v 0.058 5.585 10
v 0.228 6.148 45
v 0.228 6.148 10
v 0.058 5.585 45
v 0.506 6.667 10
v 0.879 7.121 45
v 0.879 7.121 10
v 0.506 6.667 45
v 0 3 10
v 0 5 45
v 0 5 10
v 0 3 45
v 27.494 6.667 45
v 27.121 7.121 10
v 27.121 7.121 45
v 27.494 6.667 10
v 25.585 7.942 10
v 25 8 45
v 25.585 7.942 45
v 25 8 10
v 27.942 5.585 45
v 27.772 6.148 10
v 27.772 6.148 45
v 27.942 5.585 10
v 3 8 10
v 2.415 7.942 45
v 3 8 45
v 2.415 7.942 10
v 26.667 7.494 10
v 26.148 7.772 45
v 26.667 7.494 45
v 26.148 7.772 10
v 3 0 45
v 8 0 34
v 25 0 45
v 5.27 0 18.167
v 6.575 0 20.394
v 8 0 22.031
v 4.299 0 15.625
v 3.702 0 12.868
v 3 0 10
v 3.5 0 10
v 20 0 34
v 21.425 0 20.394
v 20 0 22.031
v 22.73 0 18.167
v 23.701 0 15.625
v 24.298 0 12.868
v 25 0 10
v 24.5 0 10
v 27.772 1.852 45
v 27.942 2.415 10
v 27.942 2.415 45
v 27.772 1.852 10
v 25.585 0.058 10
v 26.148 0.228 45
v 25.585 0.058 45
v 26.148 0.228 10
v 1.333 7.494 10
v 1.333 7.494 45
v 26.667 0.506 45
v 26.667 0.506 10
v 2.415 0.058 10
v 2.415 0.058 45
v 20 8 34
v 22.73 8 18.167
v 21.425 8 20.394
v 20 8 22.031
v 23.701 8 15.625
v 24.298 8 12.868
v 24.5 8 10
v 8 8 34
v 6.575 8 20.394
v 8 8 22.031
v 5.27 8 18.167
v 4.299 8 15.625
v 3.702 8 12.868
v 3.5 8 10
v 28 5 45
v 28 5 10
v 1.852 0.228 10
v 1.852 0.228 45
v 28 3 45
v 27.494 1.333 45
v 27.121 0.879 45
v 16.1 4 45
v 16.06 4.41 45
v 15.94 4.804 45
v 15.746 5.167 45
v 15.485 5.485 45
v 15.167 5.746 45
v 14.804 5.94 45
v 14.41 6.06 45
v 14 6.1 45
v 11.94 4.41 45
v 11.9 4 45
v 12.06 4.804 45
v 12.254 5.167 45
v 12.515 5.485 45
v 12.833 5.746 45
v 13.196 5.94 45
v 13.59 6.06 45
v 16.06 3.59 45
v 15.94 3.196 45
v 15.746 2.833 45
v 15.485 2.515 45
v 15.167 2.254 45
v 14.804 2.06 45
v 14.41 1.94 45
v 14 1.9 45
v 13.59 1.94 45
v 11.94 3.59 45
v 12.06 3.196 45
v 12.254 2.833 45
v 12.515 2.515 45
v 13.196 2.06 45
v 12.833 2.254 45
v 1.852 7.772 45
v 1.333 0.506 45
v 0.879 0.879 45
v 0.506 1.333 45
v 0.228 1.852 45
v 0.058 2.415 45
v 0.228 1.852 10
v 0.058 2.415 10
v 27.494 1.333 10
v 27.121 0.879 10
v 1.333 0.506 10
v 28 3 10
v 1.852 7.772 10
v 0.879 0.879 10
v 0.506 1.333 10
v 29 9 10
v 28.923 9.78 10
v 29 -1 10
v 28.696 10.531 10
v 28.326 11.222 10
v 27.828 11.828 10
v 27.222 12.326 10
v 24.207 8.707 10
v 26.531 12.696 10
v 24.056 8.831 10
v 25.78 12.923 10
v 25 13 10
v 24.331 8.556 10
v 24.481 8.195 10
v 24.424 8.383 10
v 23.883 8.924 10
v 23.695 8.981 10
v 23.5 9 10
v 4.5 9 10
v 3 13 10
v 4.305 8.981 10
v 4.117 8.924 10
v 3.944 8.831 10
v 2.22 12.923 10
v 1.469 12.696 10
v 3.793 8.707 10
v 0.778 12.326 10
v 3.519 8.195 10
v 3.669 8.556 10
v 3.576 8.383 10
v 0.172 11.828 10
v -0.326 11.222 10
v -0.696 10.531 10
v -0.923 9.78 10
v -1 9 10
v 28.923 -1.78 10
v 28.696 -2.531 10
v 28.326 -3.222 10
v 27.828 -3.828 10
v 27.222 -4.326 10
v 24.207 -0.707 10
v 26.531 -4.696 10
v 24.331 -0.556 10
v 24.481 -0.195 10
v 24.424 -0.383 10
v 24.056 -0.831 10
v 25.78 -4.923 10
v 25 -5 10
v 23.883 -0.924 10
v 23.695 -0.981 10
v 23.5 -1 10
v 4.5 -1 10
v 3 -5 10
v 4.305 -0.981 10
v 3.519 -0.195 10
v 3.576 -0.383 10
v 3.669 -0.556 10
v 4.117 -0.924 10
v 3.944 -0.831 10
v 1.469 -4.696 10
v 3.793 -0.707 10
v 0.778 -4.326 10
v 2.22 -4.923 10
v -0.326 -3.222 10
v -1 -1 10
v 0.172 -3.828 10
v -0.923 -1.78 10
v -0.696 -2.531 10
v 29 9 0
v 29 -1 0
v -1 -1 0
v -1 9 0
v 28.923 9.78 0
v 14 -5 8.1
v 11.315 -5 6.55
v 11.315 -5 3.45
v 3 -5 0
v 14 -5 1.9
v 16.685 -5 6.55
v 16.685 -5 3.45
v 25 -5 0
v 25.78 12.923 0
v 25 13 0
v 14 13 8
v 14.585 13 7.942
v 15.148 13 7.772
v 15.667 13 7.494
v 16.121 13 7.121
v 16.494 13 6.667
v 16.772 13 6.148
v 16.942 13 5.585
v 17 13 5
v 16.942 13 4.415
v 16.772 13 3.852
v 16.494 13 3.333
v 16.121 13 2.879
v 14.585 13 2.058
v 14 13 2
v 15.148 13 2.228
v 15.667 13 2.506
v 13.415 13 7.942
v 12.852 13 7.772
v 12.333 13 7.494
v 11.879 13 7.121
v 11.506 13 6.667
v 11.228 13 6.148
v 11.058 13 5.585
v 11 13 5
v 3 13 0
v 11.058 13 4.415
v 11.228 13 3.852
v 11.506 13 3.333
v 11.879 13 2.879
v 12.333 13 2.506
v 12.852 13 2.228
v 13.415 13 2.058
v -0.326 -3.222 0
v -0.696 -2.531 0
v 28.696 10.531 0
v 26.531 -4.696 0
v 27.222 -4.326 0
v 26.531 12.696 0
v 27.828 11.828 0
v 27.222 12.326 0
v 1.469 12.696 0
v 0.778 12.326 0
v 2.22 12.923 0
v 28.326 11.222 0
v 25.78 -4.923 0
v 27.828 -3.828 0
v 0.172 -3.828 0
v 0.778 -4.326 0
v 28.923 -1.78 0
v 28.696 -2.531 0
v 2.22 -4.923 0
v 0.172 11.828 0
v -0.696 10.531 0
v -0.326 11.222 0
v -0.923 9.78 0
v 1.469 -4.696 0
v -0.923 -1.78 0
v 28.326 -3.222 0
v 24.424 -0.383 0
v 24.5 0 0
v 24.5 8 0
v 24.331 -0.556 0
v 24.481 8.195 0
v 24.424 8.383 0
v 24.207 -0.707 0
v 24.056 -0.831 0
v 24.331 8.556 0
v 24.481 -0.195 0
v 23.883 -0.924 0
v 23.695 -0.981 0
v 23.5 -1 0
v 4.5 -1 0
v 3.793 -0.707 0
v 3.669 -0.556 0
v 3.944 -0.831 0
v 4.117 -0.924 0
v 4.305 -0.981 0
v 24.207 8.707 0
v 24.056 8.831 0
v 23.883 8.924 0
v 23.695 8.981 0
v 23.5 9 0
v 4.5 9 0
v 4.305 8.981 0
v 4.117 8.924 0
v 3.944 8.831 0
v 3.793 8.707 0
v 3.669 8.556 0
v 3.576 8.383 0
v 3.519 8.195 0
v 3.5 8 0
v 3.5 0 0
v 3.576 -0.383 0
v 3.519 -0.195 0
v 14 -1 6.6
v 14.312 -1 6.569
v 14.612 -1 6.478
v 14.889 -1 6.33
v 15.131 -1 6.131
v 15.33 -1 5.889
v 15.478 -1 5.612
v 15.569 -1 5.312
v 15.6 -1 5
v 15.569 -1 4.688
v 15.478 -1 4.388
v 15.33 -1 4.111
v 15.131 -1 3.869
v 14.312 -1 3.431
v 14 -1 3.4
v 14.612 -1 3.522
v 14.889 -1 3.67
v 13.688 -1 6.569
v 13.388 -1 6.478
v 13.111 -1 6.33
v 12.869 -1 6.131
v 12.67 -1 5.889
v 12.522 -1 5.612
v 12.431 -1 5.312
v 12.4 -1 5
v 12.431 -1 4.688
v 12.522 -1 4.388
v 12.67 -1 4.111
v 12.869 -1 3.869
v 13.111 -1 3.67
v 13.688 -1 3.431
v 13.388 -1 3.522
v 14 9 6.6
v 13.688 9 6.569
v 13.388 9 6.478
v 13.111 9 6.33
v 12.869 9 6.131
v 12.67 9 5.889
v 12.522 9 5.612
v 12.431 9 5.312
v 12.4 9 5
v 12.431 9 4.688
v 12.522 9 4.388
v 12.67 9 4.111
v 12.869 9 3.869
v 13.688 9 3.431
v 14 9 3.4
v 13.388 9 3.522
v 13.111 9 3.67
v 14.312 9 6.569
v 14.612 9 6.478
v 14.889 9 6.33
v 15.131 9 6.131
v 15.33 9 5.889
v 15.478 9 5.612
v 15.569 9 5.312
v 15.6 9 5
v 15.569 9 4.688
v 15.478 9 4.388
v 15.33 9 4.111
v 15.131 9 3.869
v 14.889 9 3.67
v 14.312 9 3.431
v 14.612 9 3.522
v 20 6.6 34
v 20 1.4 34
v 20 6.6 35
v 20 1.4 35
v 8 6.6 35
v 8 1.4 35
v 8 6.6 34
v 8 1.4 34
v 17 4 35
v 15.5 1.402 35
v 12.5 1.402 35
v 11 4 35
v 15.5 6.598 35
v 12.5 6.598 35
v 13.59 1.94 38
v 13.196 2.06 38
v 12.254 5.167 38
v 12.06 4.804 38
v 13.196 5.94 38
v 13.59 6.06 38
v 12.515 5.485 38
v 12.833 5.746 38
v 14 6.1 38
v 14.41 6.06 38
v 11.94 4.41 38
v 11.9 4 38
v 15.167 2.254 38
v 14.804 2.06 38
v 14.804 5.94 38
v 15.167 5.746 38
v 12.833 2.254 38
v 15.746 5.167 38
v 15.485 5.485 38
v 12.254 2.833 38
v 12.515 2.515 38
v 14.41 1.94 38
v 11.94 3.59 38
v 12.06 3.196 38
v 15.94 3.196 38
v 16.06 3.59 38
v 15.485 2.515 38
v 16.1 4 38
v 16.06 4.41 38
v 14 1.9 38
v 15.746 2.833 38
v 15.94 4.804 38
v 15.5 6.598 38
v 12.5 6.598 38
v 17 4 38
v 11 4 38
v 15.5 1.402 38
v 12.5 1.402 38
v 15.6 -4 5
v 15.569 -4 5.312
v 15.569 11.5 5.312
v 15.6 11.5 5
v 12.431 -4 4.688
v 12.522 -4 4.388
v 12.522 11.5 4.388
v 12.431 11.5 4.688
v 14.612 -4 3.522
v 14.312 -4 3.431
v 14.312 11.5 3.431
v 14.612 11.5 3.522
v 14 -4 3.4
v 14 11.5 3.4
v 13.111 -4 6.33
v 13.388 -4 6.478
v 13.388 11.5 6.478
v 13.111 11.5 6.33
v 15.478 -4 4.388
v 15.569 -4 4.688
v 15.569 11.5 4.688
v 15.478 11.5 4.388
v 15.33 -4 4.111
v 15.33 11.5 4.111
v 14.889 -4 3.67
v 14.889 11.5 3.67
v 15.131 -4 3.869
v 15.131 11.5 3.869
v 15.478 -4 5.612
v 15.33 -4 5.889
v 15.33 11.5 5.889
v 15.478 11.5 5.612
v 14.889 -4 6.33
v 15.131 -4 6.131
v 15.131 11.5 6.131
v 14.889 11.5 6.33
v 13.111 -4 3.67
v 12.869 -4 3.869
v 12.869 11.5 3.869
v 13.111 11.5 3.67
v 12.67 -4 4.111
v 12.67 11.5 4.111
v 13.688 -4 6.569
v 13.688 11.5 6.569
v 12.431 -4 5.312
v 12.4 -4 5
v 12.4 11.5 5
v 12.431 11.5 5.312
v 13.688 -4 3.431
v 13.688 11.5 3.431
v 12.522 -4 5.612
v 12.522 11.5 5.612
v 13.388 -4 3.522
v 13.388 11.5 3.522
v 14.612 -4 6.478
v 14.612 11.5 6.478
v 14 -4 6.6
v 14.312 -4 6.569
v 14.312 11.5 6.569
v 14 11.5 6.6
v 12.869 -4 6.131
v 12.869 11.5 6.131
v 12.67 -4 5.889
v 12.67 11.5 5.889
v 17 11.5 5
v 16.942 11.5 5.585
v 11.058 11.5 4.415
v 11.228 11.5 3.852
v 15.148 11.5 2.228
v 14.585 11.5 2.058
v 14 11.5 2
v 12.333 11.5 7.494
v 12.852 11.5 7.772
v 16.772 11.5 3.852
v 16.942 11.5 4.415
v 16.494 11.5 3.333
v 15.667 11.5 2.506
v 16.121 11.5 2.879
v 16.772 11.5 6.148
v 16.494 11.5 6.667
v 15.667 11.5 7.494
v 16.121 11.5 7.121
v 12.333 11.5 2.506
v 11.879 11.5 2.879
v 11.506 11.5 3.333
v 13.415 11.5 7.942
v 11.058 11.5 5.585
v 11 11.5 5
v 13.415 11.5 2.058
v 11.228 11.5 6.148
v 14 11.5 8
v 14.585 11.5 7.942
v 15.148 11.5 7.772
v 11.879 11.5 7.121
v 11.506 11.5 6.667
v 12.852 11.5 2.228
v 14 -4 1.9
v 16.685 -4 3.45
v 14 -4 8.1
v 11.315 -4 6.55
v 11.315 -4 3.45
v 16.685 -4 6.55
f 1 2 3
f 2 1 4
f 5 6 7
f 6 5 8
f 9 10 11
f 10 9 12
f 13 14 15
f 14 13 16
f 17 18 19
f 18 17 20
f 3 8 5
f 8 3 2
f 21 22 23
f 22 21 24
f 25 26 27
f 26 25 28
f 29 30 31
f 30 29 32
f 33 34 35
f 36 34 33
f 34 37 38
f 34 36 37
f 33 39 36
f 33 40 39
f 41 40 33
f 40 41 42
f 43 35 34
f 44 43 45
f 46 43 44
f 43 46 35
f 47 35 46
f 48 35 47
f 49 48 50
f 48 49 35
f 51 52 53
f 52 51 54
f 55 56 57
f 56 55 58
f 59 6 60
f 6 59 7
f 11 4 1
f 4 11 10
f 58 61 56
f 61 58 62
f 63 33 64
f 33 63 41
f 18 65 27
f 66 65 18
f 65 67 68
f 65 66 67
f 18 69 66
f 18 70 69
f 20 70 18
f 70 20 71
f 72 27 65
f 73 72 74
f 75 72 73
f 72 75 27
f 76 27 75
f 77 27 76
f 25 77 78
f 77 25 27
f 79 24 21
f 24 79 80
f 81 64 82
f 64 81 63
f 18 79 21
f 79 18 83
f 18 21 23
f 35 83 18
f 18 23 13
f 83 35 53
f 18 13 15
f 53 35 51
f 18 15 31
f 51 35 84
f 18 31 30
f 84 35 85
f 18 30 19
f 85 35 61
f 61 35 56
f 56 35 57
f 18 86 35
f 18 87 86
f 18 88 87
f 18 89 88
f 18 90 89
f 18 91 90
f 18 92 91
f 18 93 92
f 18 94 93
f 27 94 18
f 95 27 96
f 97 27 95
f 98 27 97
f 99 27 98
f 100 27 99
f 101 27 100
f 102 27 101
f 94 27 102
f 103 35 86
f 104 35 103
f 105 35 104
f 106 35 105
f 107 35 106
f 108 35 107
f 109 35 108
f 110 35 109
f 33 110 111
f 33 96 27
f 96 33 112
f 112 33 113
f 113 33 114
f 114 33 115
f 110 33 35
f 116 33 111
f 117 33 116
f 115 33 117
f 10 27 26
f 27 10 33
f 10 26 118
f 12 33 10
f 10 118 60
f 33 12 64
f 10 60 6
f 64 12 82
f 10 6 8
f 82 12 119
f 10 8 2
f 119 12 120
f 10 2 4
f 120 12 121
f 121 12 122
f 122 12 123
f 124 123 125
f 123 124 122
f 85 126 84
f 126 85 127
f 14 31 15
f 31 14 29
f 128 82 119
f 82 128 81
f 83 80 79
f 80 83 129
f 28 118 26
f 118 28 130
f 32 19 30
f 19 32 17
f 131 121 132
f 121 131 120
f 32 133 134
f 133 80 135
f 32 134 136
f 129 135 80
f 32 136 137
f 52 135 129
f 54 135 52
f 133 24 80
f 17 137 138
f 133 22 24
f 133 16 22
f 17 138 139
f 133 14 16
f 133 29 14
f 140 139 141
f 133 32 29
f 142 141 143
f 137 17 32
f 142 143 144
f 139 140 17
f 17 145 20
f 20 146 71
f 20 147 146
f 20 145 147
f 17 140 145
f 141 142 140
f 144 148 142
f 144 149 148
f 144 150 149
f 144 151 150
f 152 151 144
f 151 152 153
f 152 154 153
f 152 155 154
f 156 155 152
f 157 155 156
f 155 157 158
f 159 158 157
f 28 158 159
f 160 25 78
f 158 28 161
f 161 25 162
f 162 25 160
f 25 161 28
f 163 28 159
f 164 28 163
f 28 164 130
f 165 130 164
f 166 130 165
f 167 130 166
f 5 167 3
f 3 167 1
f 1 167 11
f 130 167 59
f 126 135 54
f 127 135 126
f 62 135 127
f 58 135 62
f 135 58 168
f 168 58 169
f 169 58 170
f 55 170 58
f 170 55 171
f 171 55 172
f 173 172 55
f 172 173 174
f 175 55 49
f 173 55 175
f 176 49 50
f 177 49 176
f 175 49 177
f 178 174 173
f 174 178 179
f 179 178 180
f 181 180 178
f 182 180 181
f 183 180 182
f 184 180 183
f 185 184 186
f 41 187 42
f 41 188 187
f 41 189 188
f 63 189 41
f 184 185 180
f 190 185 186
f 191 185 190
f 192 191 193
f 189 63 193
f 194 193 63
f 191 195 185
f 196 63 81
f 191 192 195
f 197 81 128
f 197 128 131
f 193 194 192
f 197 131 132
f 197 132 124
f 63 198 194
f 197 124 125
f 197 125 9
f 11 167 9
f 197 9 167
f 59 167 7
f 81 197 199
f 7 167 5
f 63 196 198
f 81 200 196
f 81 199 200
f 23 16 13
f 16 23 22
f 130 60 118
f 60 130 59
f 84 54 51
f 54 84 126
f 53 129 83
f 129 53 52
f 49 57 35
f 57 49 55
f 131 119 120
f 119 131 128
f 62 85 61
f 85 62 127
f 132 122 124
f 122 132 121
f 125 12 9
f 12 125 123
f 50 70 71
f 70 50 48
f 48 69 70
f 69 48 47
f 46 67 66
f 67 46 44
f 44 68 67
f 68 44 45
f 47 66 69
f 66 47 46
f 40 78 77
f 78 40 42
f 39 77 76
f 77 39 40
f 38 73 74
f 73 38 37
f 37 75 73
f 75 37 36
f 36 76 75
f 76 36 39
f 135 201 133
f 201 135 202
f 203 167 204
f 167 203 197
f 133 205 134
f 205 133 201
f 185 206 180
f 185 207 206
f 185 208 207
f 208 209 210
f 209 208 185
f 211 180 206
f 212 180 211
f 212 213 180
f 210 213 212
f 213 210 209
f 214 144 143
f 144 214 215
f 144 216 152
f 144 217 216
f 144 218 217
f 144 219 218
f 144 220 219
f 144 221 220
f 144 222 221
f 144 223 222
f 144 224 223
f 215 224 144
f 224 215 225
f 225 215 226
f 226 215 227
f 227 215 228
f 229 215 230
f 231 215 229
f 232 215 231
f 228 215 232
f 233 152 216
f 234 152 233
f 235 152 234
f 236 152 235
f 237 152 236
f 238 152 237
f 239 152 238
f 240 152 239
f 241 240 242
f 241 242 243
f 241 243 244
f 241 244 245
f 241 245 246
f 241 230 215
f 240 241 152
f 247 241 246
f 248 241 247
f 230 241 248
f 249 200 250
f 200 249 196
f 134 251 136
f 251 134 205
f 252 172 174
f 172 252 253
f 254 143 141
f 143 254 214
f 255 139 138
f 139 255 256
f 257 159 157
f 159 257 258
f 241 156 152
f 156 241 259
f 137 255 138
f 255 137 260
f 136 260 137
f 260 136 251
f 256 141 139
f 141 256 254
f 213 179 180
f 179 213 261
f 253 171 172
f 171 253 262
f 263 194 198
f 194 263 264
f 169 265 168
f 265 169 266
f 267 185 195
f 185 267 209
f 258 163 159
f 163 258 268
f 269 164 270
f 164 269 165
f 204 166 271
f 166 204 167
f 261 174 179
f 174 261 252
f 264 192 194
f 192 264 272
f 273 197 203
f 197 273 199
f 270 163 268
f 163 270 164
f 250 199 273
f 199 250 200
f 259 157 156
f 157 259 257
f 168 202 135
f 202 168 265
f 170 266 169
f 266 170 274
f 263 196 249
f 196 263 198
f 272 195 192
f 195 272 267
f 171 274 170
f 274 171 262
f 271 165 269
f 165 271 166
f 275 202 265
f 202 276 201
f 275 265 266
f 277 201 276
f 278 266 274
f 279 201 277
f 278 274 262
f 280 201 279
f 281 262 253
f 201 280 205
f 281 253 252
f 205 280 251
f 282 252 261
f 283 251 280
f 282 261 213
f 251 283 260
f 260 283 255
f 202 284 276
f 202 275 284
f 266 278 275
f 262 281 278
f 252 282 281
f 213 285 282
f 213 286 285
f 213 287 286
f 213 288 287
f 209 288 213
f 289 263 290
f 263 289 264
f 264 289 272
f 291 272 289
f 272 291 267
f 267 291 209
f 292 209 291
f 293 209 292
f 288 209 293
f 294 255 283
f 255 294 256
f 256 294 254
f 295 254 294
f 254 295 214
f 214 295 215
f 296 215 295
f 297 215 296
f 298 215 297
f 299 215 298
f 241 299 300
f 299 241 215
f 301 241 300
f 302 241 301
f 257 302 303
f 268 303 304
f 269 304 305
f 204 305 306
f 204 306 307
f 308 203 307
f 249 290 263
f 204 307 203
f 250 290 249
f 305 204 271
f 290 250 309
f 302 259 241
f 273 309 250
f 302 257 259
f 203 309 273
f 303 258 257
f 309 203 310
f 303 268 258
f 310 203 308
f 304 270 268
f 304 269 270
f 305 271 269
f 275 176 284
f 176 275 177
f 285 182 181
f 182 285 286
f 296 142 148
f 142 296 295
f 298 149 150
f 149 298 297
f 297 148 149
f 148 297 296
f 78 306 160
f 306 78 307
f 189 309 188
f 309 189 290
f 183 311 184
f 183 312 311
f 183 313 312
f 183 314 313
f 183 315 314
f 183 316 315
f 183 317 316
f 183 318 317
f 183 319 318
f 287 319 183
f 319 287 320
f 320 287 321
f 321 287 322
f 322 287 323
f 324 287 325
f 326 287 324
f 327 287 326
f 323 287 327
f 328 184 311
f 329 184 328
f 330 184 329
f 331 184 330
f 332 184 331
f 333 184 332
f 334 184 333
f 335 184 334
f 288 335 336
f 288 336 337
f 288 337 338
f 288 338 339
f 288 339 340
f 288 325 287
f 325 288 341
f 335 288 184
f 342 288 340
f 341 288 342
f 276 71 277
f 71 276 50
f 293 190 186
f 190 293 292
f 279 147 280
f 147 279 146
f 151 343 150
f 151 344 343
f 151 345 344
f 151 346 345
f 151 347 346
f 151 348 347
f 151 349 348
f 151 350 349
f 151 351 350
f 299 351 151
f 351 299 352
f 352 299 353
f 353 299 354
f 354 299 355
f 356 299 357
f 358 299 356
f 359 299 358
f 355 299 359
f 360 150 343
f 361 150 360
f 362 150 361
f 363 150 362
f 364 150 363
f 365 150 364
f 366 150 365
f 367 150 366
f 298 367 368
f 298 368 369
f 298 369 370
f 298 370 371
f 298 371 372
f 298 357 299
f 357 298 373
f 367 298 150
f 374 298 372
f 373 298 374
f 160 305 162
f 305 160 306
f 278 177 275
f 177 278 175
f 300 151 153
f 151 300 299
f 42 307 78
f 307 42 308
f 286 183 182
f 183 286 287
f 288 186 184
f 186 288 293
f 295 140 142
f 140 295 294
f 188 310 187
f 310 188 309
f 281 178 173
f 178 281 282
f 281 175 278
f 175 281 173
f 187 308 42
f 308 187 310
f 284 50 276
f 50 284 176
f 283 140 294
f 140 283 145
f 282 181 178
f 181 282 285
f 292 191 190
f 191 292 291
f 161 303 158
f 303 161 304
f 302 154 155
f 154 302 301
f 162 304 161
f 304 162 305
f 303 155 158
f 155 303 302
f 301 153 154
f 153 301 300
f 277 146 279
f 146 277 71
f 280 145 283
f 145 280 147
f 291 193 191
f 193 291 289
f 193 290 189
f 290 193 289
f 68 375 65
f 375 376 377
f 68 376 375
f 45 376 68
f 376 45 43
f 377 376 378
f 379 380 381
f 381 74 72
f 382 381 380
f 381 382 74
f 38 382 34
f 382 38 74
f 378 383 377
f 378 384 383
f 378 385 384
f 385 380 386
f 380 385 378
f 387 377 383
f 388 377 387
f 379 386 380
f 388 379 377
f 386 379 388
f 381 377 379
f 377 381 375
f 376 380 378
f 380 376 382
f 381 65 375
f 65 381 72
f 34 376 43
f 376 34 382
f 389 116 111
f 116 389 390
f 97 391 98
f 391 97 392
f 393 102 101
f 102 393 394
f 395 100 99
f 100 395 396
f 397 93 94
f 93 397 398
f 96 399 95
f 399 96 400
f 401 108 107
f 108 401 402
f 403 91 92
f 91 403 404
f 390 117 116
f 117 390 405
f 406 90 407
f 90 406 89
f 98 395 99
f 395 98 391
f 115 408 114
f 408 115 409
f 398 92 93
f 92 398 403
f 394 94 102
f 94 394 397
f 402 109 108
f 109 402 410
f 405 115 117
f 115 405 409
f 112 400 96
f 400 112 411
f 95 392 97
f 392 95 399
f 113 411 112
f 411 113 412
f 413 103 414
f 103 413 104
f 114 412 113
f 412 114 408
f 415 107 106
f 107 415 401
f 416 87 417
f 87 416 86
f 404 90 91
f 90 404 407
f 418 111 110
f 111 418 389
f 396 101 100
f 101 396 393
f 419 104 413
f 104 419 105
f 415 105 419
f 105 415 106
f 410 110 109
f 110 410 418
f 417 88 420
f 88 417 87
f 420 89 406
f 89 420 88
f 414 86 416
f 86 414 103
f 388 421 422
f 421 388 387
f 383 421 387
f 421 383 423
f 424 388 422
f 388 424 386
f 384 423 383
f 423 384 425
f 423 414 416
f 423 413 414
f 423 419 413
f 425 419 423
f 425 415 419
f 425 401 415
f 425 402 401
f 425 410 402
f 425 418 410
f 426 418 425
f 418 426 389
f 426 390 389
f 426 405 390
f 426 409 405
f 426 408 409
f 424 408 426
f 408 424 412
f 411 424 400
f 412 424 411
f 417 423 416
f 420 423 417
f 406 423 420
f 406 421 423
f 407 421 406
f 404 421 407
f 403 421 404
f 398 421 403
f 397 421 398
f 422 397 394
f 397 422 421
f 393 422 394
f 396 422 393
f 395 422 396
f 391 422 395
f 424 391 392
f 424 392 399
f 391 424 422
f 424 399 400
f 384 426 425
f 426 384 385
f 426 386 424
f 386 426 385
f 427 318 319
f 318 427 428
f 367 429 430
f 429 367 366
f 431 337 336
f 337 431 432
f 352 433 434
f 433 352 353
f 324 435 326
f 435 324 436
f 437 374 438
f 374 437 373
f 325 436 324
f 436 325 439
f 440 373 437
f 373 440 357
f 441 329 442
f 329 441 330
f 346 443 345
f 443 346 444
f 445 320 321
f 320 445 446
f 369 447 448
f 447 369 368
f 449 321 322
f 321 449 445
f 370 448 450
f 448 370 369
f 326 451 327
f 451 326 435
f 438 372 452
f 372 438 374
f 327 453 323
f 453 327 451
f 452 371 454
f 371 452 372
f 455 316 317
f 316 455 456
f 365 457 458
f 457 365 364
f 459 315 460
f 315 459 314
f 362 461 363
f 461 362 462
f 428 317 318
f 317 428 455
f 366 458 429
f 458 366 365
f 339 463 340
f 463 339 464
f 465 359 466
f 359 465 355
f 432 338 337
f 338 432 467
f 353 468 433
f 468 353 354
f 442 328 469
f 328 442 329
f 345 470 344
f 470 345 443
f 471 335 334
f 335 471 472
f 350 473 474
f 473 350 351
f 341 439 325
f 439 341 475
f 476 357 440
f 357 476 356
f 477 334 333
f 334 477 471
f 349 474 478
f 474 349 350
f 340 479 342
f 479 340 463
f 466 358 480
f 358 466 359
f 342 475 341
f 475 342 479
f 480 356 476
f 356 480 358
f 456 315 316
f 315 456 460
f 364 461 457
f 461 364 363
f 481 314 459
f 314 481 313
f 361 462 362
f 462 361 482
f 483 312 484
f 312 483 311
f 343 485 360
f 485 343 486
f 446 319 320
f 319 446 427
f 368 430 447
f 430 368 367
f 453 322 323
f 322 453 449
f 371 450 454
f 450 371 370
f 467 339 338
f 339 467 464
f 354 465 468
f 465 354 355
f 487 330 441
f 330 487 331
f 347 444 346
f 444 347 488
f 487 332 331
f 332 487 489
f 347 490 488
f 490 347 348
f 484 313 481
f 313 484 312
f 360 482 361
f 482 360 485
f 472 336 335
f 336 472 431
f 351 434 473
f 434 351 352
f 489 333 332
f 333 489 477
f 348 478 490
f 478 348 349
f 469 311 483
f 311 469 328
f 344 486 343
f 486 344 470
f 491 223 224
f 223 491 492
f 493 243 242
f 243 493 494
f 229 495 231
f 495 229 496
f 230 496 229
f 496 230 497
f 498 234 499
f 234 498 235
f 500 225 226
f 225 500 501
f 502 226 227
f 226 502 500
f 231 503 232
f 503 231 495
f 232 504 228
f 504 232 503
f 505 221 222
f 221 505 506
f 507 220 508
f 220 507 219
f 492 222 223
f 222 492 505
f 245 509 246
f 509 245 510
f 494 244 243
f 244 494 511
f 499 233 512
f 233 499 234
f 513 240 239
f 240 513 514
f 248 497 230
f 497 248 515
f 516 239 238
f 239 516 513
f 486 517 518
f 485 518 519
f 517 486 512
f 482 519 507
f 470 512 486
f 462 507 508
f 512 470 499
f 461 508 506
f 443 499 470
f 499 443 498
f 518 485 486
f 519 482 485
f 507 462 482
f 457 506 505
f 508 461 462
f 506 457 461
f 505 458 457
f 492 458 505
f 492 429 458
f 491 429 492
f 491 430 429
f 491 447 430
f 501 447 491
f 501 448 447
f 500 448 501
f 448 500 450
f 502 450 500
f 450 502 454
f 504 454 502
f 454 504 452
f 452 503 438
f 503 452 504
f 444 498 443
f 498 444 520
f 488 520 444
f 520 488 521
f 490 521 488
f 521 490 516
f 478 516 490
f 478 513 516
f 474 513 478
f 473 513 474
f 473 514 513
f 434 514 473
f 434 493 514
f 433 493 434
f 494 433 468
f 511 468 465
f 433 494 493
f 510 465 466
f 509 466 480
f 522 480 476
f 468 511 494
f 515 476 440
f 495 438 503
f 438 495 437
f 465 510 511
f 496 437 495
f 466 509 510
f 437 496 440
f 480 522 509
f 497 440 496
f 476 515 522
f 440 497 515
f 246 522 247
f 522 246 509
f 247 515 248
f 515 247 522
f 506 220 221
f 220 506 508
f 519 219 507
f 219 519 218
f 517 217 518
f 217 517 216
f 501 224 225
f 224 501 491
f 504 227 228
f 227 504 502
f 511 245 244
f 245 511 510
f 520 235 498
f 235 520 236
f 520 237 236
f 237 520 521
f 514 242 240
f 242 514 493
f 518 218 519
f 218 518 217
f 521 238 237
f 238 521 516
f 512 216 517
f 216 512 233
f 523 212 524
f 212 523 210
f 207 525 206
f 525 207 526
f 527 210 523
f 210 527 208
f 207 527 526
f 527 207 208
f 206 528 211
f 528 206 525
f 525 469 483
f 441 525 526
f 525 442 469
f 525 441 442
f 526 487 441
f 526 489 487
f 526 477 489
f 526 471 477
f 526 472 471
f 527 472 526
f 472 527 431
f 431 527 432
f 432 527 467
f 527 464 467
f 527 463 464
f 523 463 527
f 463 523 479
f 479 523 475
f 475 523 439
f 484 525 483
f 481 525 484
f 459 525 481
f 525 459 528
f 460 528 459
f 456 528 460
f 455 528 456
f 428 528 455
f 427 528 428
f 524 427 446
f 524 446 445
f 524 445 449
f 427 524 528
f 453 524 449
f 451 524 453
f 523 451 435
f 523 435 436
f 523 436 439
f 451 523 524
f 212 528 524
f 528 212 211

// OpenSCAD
$fn=32;

translate([0,0,45]) rotate(a=90, v=[0,1,0]) {
    difference() {
        mainBody(45,8,28);
        mainSubtractions(45,8,28);
    }
}

module cubeWithXHorizontalFillets(length, width, height, radius, center) {
    diameter = radius * 2;
    translate([0, radius/2, radius/2]) {
        minkowski() {
            cube([length/2, width-radius, height-radius]);
            rotate(a=90,v=[0,1,0]) cylinder(r=radius/2,h=length/2);
        } 
    }
}

module mainBody(length, width, height) 
{
	offsetValue = length - 5;
	difference()
	{
		cubeWithXHorizontalFillets(length - 10, width, height, 6);
		translate([offsetValue - 5, 9, 14]) scale([1.4,1,1]) rotate(a=90,v=[1,0,0]) cylinder(h = 10, r = 10.5);
	}
	difference()
	{
		translate([length - 10, -5, -1]) cubeWithXHorizontalFillets(10,18,30,8);
		translate([offsetValue - 5.1, -1, 3.5]) cubeWithXHorizontalFillets(10.2,10,21,2);
	}
}

module mainSubtractions(length, width, height) {
    offsetValue = length - 5;
	translate([10, 1.4, 8]) cube([1.1, 5.2, 12]);
    translate([11, -0.1, 8]) cube([20, 8.2, 12]);
    translate([-0.1,4,14]) rotate(a=90,v=[0,1,0]) cylinder(h=10,r=2.1);
    translate([7,4,14]) rotate(a=90,v=[0,1,0]) cylinder($fn=6, h=3.1,r=3);
    
    // Pully Hole
    translate([offsetValue,13.1,14]) rotate(a=90, v=[1,0,0]) cylinder(h=18,r=1.6);
    translate([offsetValue,13.1,14]) rotate(a=90, v=[1,0,0]) cylinder(h=1.6,r=3);
    translate([offsetValue,-4,14]) rotate(a=90, v=[1,0,0]) cylinder($fn=6, h=1.5,r=3.1);
}
